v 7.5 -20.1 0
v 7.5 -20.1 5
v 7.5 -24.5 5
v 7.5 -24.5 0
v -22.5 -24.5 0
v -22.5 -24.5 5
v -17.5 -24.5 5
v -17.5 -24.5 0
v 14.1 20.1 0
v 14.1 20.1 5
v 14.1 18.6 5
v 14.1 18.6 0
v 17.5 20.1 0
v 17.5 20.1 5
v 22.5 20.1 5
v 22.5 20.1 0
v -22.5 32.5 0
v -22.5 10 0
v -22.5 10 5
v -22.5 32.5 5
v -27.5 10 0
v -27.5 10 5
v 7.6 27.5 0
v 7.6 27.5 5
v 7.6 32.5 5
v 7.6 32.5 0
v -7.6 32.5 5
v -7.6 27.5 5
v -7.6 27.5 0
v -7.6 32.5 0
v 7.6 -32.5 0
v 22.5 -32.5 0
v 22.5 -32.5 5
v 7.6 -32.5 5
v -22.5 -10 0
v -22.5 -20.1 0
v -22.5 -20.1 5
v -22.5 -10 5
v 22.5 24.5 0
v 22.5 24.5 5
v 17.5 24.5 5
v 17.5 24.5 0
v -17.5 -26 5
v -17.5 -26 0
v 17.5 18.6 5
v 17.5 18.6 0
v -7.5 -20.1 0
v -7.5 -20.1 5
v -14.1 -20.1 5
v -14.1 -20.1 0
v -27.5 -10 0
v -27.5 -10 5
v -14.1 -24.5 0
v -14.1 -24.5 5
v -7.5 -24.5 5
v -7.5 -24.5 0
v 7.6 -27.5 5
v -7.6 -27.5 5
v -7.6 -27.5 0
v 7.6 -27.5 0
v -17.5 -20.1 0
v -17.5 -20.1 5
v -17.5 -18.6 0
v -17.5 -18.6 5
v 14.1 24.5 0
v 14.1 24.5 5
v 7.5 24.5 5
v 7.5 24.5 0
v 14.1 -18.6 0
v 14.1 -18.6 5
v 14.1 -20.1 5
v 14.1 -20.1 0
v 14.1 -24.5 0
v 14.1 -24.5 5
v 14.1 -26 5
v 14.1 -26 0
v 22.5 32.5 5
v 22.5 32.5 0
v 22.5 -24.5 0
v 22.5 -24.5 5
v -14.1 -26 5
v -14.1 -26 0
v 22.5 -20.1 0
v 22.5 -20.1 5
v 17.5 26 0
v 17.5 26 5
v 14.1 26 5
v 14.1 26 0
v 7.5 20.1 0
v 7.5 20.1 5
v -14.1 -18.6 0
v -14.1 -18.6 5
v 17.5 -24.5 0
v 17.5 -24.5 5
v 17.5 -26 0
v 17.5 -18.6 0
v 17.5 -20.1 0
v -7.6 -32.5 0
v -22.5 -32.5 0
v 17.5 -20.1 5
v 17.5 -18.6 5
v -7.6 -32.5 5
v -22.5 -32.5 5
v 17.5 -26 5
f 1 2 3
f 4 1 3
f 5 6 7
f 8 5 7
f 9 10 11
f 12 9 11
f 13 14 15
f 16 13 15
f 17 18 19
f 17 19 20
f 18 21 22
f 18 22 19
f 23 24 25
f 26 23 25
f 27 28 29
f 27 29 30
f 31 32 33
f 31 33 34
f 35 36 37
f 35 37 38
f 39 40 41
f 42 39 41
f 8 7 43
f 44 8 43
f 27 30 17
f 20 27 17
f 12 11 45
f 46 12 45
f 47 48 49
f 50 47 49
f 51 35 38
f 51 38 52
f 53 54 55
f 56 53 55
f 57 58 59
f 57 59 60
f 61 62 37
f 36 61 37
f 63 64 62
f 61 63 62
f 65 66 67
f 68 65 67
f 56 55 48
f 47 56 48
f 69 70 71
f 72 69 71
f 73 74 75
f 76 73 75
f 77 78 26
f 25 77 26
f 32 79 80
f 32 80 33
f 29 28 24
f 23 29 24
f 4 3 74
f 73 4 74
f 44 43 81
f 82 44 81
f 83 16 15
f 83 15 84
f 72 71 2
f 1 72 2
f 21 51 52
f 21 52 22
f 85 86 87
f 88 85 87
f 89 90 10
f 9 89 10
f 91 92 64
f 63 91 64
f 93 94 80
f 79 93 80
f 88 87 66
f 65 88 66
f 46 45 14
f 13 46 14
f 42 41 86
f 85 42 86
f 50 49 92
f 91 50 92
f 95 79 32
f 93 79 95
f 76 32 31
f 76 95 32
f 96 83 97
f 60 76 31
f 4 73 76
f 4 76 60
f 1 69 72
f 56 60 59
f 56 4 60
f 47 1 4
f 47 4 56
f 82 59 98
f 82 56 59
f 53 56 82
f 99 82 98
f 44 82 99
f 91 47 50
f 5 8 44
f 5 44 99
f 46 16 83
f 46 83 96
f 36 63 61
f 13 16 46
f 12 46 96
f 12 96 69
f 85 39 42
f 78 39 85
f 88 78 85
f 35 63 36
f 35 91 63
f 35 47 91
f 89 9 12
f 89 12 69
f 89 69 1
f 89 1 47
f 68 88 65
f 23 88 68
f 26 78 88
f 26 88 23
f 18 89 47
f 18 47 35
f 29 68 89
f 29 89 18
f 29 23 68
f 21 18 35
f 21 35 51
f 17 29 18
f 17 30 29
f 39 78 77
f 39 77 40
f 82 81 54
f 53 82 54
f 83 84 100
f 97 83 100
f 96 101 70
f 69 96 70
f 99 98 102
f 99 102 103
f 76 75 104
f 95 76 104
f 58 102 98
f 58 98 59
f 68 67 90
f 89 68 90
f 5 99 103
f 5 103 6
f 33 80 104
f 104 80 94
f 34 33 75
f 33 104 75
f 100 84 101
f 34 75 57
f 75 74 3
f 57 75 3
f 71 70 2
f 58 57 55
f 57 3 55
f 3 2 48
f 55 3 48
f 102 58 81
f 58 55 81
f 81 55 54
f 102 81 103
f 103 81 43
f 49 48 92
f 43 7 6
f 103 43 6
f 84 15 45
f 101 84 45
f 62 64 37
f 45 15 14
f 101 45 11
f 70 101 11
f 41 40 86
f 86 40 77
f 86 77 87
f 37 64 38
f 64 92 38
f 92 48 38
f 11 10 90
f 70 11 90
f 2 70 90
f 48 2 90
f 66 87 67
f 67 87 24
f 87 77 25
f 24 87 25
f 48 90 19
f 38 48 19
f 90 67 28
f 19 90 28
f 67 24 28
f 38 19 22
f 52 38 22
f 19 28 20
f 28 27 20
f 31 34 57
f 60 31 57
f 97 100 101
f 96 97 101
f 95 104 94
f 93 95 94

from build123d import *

# Parameters (mm, degrees)
BOSS_EXTRUDE1_DEPTH = 5
CUT_EXTRUDE1_DEPTH  = 5
SKETCH4_W           = 15.2
SKETCH4_H           = 5
CUT_EXTRUDE2_DEPTH  = 10


with BuildPart() as part:
    # Sketch1 → Boss-Extrude1 (new body)
    with BuildSketch(Plane.XY):
        Polygon((-22.5, 32.5), (0, 32.5), (22.5, 32.5), (22.5, -32.5), (-22.5, -32.5), (-22.5, -10), (-27.5, -10), (-27.5, 10), (-22.5, 10), align=None)
    extrude(amount=BOSS_EXTRUDE1_DEPTH)

    # Sketch3 → Cut-Extrude1 (cut)
    with BuildSketch(Plane.XY.offset(5)):
        Polygon((22.5, 24.5), (17.5, 24.5), (17.5, 26), (14.1, 26), (14.1, 24.5), (7.5, 24.5), (7.5, 20.1), (14.1, 20.1), (14.1, 18.6), (17.5, 18.6), (17.5, 20.1), (22.5, 20.1), align=None)
        Polygon((22.5, -24.5), (22.5, -20.1), (17.5, -20.1), (17.5, -18.6), (14.1, -18.6), (14.1, -20.1), (7.5, -20.1), (7.5, -24.5), (14.1, -24.5), (14.1, -26), (17.5, -26), (17.5, -24.5), align=None)
        Polygon((-22.5, -24.5), (-17.5, -24.5), (-17.5, -26), (-14.1, -26), (-14.1, -24.5), (-7.5, -24.5), (-7.5, -20.1), (-14.1, -20.1), (-14.1, -18.6), (-17.5, -18.6), (-17.5, -20.1), (-22.5, -20.1), align=None)
    extrude(amount=-CUT_EXTRUDE1_DEPTH, mode=Mode.SUBTRACT)

    # Sketch4 → Cut-Extrude2 (cut)
    with BuildSketch(Plane.XY.offset(5)):
        with Locations((0, -30)):
            Rectangle(SKETCH4_W, SKETCH4_H)
        with Locations((0, 30)):
            Rectangle(SKETCH4_W, SKETCH4_H)
    extrude(amount=-CUT_EXTRUDE2_DEPTH, mode=Mode.SUBTRACT)


solid = part.part
